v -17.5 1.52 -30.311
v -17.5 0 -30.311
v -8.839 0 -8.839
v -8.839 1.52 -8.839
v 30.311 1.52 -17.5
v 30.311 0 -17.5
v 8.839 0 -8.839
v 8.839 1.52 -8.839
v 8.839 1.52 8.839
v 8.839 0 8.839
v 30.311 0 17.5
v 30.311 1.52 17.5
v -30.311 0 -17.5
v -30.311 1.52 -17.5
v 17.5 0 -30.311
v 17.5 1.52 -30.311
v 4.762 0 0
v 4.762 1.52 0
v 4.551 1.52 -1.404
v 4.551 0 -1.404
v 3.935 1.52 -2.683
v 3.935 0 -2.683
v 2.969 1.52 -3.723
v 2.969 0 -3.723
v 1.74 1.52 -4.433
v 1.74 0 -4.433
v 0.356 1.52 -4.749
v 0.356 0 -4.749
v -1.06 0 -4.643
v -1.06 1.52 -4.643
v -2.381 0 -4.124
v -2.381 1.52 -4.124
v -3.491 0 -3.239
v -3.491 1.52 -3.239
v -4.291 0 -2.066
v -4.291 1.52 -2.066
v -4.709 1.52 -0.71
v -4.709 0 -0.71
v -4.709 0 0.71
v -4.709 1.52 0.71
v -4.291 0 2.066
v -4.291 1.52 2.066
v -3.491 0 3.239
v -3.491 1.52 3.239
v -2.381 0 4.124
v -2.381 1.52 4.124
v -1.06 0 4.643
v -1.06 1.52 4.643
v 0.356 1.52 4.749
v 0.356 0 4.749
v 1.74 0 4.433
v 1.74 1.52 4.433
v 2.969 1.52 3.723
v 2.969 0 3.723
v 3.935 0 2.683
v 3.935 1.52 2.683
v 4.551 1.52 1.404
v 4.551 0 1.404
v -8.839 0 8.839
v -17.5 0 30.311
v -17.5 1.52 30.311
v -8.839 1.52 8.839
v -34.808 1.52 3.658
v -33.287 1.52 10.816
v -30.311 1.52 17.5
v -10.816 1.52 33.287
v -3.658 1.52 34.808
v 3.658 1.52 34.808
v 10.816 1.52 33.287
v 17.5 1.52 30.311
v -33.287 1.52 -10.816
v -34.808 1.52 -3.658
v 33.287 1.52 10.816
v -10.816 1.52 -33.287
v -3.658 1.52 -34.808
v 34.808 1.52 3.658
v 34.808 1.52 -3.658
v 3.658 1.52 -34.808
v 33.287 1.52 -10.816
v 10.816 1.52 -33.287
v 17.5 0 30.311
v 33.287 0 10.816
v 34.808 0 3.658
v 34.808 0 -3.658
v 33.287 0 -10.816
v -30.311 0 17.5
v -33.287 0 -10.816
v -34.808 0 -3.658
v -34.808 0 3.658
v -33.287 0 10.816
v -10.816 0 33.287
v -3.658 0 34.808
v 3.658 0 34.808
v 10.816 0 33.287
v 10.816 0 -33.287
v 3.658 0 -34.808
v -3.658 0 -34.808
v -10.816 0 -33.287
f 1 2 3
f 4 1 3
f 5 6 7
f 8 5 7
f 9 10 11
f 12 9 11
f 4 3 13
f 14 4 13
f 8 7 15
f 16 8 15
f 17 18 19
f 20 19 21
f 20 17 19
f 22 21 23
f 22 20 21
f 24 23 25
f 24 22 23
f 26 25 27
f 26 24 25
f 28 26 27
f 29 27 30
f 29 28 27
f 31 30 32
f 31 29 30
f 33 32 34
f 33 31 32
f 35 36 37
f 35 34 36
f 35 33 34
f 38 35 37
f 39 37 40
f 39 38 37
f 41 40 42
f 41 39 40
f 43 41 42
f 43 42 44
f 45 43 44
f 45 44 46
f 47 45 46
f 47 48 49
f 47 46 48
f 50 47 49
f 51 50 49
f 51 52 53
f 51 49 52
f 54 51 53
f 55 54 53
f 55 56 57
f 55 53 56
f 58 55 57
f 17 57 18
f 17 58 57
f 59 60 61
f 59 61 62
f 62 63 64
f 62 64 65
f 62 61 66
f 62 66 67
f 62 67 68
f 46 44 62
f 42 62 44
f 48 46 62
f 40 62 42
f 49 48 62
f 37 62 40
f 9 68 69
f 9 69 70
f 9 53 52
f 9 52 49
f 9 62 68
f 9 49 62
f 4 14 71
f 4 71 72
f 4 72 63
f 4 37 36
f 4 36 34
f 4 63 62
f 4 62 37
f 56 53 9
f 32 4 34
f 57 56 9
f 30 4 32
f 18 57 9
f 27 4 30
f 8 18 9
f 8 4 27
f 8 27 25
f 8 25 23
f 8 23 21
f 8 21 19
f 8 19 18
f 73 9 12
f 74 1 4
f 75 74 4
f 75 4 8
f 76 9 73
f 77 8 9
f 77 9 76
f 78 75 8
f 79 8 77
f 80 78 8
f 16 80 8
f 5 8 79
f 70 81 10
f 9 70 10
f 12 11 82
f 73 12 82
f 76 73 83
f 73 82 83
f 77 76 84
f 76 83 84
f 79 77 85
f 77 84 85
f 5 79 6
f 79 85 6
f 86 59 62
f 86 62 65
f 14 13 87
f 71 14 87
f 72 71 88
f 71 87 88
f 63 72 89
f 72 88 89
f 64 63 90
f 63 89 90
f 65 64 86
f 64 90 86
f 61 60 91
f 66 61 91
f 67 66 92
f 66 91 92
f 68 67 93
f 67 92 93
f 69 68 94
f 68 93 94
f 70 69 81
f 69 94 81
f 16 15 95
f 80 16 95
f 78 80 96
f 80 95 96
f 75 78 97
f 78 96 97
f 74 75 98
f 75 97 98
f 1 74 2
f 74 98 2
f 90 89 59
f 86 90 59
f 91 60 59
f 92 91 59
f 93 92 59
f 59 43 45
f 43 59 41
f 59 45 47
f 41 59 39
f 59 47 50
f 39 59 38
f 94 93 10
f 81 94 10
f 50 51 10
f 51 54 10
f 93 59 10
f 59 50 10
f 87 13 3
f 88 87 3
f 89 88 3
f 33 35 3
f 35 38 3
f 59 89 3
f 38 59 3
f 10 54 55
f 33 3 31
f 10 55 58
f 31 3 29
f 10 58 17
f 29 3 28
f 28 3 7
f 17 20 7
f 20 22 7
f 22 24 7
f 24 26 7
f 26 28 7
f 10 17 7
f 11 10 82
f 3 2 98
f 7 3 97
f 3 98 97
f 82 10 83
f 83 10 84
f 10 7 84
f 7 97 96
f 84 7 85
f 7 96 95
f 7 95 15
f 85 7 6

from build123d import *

# Parameters (mm, degrees)
BOSS_EXTRUDE1_DEPTH     = 1.52
SKETCH2_R               = 4.7625
CUT_EXTRUDE5_DEPTH      = 2.52
CUT_EXTRUDE5_DEPTH_BACK = 1


with BuildPart() as part:
    # Sketch1 → Boss-Extrude1 (new body)
    with BuildSketch(Plane(origin=(0, 0, 0), x_dir=(1, 0, 0), z_dir=(0, 1, 0))):
        with BuildLine():
            Line((-17.5, 30.310889132), (-17.5, 17.5))
            Line((-17.5, 17.5), (-30.310889132, 17.5))
            ThreePointArc((-30.310889132, 17.5), (-35, 0), (-30.310889132, -17.5))
            Line((-30.310889132, -17.5), (-17.5, -17.5))
            Line((-17.5, -17.5), (-17.5, -30.310889132))
            ThreePointArc((-17.5, -30.310889132), (0, -35), (17.5, -30.310889132))
            Line((17.5, -30.310889132), (17.5, -17.5))
            Line((17.5, -17.5), (30.310889132, -17.5))
            ThreePointArc((30.310889132, -17.5), (35, 0), (30.310889132, 17.5))
            Line((30.310889132, 17.5), (17.5, 17.5))
            Line((17.5, 17.5), (17.5, 30.310889132))
            ThreePointArc((17.5, 30.310889132), (0, 35), (-17.5, 30.310889132))
        make_face()
    extrude(amount=BOSS_EXTRUDE1_DEPTH)

    # Sketch2 → Cut-Extrude5 (cut, two sides)
    with BuildSketch(Plane(origin=(0, 0, 0), x_dir=(1, 0, 0), z_dir=(0, 1, 0))) as cut_extrude5_sk:
        Circle(SKETCH2_R)
        Polygon((-30.310889132, 17.5), (-17.5, 30.310889132), (-8.838834765, 8.838834765), align=None)
        Polygon((17.5, 30.310889132), (30.310889132, 17.5), (8.838834765, 8.838834765), align=None)
        Polygon((30.310889132, -17.5), (17.5, -30.310889132), (8.838834765, -8.838834765), align=None)
        Polygon((-30.310889132, -17.5), (-17.5, -30.310889132), (-8.838834765, -8.838834765), align=None)
    extrude(amount=CUT_EXTRUDE5_DEPTH, mode=Mode.SUBTRACT)
    extrude(cut_extrude5_sk.sketch, amount=-CUT_EXTRUDE5_DEPTH_BACK, mode=Mode.SUBTRACT)


solid = part.part
